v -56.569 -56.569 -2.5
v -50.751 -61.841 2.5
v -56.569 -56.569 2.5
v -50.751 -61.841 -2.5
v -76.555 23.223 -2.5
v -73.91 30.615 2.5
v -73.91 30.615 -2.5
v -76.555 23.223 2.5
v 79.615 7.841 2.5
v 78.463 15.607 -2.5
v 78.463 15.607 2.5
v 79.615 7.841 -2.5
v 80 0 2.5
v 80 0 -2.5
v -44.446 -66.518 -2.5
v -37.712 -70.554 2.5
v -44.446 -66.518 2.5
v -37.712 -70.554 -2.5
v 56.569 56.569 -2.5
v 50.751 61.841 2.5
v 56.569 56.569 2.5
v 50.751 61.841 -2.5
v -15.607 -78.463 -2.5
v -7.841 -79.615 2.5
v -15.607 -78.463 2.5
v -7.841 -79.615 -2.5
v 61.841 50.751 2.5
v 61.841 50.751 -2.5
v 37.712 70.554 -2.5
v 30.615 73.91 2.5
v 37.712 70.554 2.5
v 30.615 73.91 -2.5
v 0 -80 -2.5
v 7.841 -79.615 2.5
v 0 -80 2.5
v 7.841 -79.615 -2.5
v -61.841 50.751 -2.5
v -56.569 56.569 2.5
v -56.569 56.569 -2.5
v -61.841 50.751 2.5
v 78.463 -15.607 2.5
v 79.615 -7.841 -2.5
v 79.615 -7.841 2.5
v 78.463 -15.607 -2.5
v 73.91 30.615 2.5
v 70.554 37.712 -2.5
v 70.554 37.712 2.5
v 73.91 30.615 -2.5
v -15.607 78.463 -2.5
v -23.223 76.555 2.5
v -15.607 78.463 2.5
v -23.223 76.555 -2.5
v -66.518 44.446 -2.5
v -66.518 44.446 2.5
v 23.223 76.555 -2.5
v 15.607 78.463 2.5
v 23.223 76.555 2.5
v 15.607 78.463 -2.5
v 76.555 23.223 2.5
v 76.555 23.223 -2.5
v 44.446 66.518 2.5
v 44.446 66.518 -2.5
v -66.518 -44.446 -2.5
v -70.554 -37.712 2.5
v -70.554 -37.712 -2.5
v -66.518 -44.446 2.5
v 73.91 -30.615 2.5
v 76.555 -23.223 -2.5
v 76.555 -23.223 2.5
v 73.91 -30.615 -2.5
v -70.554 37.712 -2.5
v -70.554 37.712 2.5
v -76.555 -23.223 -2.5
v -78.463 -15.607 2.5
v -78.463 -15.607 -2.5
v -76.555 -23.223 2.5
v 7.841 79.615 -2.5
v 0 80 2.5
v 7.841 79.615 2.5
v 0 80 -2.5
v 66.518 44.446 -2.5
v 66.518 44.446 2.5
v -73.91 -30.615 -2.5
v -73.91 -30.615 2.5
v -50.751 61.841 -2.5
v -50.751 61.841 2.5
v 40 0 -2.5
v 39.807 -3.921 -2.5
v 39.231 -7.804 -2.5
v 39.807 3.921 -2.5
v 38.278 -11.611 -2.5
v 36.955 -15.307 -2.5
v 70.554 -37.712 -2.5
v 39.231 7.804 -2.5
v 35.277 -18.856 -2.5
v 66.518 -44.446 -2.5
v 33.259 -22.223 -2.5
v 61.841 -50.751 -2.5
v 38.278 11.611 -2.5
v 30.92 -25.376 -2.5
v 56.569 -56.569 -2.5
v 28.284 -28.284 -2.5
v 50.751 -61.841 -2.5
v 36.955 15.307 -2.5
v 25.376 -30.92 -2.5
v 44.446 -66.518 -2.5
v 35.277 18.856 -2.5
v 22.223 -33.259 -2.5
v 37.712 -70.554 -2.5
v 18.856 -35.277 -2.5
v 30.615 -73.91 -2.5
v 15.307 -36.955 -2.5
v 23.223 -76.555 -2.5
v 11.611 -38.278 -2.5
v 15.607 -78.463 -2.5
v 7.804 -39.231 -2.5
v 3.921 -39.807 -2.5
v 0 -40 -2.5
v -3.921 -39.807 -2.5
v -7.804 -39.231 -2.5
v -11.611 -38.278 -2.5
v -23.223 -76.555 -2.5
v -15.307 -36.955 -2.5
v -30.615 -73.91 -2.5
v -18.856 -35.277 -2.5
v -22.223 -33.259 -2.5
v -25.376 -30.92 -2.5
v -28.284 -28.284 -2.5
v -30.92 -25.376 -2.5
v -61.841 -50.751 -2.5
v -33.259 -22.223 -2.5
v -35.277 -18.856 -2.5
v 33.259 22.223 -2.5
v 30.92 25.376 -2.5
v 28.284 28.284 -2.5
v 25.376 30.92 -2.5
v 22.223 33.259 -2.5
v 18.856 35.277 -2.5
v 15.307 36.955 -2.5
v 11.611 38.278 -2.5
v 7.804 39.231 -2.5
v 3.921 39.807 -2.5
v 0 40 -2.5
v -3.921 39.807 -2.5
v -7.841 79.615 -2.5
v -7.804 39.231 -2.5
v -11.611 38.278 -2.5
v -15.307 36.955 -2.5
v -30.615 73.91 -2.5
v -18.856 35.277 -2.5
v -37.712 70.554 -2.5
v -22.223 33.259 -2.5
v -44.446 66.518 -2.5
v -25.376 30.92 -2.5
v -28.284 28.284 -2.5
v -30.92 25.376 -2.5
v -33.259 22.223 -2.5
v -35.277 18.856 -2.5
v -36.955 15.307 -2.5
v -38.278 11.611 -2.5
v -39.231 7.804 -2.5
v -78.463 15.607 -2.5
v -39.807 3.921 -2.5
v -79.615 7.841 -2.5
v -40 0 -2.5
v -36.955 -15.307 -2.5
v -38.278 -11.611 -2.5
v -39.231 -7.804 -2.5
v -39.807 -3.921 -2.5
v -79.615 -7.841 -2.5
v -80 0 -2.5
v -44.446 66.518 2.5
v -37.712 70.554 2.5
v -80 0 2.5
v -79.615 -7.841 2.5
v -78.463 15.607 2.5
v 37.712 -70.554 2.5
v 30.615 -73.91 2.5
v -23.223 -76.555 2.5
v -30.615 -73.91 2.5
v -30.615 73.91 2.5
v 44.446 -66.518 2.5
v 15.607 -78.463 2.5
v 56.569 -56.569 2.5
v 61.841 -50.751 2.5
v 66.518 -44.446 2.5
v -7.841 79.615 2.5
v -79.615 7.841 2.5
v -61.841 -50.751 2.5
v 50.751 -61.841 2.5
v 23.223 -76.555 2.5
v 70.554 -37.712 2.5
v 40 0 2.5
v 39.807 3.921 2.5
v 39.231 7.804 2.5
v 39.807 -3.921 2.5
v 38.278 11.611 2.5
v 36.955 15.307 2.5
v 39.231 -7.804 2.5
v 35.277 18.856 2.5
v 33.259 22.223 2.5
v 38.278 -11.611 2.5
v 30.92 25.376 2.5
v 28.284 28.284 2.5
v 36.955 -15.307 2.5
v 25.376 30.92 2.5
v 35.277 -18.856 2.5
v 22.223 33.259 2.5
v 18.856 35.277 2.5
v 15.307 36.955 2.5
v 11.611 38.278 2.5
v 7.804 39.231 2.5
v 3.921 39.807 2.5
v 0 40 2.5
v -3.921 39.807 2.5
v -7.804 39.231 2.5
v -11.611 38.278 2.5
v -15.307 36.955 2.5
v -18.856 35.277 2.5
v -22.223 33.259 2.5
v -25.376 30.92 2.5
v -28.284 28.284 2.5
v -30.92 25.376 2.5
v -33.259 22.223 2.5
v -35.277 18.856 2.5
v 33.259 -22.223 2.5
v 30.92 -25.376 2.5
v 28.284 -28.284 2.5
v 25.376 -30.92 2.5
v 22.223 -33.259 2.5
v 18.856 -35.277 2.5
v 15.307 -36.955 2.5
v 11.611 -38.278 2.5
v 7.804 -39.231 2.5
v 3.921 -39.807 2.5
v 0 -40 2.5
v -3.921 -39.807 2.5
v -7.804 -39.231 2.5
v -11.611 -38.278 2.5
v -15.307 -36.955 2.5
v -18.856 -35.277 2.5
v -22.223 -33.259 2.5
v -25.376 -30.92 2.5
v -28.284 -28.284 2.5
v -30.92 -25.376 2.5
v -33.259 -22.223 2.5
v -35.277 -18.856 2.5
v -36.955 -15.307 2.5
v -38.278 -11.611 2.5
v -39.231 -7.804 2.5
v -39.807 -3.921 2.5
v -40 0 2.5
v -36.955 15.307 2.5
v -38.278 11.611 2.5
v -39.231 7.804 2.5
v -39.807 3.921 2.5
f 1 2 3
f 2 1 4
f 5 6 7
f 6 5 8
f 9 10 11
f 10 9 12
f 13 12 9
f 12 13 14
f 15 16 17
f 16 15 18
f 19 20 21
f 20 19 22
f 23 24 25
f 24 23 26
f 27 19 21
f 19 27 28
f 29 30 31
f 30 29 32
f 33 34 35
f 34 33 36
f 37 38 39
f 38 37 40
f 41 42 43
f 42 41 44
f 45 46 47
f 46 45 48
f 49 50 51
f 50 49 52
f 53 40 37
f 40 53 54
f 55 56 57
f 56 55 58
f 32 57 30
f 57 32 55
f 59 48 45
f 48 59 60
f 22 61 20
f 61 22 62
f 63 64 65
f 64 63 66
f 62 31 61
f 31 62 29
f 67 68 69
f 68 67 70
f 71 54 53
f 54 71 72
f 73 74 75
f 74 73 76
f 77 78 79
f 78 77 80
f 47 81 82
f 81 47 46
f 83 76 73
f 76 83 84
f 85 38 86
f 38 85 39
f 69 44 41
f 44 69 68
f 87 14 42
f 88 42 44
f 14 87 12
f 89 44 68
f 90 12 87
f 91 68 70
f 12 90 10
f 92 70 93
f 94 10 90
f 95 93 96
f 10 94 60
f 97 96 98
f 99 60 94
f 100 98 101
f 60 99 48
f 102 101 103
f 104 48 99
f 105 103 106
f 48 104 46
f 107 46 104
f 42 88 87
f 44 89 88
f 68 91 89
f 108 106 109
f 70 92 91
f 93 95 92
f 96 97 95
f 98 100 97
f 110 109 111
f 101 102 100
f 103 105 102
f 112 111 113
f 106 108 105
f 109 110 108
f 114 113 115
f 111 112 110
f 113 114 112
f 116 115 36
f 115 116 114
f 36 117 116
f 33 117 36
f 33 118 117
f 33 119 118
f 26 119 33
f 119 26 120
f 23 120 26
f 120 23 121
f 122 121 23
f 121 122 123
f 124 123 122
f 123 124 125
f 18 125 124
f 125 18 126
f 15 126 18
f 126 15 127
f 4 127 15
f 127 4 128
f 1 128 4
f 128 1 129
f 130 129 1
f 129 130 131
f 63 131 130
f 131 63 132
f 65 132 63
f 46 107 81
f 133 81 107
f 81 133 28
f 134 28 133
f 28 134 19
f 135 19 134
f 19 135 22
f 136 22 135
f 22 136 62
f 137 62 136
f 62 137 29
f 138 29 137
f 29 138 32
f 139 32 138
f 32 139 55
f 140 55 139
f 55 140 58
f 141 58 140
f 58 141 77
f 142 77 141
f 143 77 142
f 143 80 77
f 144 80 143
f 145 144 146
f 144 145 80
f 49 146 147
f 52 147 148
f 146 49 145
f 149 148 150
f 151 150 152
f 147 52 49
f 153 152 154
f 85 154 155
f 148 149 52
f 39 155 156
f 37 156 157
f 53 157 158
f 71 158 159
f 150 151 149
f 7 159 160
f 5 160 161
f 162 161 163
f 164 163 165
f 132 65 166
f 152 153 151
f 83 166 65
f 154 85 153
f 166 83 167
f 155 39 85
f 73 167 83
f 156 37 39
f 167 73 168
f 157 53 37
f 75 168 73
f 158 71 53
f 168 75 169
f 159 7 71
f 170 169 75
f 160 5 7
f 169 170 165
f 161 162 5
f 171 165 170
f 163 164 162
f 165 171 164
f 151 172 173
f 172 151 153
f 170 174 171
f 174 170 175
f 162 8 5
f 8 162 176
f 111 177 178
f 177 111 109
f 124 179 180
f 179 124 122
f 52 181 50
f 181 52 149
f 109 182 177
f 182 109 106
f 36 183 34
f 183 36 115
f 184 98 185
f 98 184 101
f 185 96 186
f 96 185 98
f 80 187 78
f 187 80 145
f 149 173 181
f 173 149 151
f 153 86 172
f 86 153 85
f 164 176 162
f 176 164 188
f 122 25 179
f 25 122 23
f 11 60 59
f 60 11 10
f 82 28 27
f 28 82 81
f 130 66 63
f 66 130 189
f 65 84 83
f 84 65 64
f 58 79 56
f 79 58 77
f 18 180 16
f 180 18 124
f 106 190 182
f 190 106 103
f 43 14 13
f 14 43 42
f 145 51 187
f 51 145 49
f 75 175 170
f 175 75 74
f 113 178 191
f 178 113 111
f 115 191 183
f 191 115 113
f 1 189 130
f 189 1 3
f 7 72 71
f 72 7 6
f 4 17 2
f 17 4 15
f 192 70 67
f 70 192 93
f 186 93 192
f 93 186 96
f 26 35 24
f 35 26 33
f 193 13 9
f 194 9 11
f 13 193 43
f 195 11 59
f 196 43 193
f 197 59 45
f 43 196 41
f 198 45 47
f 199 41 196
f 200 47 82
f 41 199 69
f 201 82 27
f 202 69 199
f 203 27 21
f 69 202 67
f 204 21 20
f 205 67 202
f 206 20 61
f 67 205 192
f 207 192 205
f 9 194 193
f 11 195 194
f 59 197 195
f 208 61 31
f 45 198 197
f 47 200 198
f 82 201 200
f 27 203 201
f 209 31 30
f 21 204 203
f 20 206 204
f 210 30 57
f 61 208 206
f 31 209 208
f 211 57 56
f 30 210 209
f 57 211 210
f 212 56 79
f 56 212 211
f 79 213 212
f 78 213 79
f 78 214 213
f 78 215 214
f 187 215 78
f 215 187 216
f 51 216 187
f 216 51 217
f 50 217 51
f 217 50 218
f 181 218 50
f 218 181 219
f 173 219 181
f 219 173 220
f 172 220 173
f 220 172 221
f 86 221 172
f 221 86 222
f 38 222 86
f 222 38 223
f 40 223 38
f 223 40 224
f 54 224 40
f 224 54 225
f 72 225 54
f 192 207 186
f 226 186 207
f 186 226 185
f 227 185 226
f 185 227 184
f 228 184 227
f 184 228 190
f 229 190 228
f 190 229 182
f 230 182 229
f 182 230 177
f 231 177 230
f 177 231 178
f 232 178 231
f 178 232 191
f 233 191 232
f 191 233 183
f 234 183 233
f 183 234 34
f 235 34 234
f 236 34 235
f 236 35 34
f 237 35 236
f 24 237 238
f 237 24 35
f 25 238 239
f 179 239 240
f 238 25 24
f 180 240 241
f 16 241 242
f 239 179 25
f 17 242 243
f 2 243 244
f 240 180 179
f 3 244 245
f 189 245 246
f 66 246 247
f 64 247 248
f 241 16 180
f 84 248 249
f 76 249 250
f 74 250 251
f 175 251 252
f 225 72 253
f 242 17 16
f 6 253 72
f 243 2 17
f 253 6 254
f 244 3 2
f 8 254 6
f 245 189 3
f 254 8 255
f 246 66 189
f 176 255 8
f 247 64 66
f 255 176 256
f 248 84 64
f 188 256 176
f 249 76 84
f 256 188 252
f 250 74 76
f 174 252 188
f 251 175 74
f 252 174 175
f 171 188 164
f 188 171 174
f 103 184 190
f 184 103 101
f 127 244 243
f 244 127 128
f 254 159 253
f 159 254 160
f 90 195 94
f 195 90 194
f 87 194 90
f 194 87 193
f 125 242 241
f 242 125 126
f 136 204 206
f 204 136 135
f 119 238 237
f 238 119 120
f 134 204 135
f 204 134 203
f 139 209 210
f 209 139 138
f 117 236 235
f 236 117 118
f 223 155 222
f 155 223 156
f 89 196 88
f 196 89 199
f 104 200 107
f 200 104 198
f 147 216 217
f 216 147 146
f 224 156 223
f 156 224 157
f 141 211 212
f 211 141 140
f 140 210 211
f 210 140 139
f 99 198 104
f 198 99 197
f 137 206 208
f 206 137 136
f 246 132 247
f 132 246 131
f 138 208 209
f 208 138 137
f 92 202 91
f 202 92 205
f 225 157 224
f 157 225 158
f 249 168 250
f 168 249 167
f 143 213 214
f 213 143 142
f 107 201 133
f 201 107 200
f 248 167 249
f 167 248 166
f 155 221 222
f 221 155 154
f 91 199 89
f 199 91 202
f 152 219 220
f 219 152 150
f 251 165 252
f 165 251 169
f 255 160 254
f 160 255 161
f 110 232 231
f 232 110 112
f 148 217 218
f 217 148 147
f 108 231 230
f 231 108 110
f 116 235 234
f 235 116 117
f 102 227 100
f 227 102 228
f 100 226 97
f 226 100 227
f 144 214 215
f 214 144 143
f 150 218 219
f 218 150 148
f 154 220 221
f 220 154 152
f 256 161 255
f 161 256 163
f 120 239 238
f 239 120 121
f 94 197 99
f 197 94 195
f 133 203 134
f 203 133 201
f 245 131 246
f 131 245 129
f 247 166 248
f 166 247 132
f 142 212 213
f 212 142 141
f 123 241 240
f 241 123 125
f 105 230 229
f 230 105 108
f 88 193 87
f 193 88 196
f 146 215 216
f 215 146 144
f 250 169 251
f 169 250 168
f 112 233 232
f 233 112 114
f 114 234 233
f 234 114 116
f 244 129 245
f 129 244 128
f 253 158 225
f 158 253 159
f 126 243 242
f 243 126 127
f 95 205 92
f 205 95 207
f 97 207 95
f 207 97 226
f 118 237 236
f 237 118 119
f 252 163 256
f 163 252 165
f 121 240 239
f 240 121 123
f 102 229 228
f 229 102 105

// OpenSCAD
module BrakeDisc()
{
  $fn = 64;

  color("green")
  {
    /* TODO */
    difference()
    {
      cylinder(d=160, h=5, center=true);
      cylinder(d=80, h=6, center=true);
    }
  }
}

BrakeDisc();
